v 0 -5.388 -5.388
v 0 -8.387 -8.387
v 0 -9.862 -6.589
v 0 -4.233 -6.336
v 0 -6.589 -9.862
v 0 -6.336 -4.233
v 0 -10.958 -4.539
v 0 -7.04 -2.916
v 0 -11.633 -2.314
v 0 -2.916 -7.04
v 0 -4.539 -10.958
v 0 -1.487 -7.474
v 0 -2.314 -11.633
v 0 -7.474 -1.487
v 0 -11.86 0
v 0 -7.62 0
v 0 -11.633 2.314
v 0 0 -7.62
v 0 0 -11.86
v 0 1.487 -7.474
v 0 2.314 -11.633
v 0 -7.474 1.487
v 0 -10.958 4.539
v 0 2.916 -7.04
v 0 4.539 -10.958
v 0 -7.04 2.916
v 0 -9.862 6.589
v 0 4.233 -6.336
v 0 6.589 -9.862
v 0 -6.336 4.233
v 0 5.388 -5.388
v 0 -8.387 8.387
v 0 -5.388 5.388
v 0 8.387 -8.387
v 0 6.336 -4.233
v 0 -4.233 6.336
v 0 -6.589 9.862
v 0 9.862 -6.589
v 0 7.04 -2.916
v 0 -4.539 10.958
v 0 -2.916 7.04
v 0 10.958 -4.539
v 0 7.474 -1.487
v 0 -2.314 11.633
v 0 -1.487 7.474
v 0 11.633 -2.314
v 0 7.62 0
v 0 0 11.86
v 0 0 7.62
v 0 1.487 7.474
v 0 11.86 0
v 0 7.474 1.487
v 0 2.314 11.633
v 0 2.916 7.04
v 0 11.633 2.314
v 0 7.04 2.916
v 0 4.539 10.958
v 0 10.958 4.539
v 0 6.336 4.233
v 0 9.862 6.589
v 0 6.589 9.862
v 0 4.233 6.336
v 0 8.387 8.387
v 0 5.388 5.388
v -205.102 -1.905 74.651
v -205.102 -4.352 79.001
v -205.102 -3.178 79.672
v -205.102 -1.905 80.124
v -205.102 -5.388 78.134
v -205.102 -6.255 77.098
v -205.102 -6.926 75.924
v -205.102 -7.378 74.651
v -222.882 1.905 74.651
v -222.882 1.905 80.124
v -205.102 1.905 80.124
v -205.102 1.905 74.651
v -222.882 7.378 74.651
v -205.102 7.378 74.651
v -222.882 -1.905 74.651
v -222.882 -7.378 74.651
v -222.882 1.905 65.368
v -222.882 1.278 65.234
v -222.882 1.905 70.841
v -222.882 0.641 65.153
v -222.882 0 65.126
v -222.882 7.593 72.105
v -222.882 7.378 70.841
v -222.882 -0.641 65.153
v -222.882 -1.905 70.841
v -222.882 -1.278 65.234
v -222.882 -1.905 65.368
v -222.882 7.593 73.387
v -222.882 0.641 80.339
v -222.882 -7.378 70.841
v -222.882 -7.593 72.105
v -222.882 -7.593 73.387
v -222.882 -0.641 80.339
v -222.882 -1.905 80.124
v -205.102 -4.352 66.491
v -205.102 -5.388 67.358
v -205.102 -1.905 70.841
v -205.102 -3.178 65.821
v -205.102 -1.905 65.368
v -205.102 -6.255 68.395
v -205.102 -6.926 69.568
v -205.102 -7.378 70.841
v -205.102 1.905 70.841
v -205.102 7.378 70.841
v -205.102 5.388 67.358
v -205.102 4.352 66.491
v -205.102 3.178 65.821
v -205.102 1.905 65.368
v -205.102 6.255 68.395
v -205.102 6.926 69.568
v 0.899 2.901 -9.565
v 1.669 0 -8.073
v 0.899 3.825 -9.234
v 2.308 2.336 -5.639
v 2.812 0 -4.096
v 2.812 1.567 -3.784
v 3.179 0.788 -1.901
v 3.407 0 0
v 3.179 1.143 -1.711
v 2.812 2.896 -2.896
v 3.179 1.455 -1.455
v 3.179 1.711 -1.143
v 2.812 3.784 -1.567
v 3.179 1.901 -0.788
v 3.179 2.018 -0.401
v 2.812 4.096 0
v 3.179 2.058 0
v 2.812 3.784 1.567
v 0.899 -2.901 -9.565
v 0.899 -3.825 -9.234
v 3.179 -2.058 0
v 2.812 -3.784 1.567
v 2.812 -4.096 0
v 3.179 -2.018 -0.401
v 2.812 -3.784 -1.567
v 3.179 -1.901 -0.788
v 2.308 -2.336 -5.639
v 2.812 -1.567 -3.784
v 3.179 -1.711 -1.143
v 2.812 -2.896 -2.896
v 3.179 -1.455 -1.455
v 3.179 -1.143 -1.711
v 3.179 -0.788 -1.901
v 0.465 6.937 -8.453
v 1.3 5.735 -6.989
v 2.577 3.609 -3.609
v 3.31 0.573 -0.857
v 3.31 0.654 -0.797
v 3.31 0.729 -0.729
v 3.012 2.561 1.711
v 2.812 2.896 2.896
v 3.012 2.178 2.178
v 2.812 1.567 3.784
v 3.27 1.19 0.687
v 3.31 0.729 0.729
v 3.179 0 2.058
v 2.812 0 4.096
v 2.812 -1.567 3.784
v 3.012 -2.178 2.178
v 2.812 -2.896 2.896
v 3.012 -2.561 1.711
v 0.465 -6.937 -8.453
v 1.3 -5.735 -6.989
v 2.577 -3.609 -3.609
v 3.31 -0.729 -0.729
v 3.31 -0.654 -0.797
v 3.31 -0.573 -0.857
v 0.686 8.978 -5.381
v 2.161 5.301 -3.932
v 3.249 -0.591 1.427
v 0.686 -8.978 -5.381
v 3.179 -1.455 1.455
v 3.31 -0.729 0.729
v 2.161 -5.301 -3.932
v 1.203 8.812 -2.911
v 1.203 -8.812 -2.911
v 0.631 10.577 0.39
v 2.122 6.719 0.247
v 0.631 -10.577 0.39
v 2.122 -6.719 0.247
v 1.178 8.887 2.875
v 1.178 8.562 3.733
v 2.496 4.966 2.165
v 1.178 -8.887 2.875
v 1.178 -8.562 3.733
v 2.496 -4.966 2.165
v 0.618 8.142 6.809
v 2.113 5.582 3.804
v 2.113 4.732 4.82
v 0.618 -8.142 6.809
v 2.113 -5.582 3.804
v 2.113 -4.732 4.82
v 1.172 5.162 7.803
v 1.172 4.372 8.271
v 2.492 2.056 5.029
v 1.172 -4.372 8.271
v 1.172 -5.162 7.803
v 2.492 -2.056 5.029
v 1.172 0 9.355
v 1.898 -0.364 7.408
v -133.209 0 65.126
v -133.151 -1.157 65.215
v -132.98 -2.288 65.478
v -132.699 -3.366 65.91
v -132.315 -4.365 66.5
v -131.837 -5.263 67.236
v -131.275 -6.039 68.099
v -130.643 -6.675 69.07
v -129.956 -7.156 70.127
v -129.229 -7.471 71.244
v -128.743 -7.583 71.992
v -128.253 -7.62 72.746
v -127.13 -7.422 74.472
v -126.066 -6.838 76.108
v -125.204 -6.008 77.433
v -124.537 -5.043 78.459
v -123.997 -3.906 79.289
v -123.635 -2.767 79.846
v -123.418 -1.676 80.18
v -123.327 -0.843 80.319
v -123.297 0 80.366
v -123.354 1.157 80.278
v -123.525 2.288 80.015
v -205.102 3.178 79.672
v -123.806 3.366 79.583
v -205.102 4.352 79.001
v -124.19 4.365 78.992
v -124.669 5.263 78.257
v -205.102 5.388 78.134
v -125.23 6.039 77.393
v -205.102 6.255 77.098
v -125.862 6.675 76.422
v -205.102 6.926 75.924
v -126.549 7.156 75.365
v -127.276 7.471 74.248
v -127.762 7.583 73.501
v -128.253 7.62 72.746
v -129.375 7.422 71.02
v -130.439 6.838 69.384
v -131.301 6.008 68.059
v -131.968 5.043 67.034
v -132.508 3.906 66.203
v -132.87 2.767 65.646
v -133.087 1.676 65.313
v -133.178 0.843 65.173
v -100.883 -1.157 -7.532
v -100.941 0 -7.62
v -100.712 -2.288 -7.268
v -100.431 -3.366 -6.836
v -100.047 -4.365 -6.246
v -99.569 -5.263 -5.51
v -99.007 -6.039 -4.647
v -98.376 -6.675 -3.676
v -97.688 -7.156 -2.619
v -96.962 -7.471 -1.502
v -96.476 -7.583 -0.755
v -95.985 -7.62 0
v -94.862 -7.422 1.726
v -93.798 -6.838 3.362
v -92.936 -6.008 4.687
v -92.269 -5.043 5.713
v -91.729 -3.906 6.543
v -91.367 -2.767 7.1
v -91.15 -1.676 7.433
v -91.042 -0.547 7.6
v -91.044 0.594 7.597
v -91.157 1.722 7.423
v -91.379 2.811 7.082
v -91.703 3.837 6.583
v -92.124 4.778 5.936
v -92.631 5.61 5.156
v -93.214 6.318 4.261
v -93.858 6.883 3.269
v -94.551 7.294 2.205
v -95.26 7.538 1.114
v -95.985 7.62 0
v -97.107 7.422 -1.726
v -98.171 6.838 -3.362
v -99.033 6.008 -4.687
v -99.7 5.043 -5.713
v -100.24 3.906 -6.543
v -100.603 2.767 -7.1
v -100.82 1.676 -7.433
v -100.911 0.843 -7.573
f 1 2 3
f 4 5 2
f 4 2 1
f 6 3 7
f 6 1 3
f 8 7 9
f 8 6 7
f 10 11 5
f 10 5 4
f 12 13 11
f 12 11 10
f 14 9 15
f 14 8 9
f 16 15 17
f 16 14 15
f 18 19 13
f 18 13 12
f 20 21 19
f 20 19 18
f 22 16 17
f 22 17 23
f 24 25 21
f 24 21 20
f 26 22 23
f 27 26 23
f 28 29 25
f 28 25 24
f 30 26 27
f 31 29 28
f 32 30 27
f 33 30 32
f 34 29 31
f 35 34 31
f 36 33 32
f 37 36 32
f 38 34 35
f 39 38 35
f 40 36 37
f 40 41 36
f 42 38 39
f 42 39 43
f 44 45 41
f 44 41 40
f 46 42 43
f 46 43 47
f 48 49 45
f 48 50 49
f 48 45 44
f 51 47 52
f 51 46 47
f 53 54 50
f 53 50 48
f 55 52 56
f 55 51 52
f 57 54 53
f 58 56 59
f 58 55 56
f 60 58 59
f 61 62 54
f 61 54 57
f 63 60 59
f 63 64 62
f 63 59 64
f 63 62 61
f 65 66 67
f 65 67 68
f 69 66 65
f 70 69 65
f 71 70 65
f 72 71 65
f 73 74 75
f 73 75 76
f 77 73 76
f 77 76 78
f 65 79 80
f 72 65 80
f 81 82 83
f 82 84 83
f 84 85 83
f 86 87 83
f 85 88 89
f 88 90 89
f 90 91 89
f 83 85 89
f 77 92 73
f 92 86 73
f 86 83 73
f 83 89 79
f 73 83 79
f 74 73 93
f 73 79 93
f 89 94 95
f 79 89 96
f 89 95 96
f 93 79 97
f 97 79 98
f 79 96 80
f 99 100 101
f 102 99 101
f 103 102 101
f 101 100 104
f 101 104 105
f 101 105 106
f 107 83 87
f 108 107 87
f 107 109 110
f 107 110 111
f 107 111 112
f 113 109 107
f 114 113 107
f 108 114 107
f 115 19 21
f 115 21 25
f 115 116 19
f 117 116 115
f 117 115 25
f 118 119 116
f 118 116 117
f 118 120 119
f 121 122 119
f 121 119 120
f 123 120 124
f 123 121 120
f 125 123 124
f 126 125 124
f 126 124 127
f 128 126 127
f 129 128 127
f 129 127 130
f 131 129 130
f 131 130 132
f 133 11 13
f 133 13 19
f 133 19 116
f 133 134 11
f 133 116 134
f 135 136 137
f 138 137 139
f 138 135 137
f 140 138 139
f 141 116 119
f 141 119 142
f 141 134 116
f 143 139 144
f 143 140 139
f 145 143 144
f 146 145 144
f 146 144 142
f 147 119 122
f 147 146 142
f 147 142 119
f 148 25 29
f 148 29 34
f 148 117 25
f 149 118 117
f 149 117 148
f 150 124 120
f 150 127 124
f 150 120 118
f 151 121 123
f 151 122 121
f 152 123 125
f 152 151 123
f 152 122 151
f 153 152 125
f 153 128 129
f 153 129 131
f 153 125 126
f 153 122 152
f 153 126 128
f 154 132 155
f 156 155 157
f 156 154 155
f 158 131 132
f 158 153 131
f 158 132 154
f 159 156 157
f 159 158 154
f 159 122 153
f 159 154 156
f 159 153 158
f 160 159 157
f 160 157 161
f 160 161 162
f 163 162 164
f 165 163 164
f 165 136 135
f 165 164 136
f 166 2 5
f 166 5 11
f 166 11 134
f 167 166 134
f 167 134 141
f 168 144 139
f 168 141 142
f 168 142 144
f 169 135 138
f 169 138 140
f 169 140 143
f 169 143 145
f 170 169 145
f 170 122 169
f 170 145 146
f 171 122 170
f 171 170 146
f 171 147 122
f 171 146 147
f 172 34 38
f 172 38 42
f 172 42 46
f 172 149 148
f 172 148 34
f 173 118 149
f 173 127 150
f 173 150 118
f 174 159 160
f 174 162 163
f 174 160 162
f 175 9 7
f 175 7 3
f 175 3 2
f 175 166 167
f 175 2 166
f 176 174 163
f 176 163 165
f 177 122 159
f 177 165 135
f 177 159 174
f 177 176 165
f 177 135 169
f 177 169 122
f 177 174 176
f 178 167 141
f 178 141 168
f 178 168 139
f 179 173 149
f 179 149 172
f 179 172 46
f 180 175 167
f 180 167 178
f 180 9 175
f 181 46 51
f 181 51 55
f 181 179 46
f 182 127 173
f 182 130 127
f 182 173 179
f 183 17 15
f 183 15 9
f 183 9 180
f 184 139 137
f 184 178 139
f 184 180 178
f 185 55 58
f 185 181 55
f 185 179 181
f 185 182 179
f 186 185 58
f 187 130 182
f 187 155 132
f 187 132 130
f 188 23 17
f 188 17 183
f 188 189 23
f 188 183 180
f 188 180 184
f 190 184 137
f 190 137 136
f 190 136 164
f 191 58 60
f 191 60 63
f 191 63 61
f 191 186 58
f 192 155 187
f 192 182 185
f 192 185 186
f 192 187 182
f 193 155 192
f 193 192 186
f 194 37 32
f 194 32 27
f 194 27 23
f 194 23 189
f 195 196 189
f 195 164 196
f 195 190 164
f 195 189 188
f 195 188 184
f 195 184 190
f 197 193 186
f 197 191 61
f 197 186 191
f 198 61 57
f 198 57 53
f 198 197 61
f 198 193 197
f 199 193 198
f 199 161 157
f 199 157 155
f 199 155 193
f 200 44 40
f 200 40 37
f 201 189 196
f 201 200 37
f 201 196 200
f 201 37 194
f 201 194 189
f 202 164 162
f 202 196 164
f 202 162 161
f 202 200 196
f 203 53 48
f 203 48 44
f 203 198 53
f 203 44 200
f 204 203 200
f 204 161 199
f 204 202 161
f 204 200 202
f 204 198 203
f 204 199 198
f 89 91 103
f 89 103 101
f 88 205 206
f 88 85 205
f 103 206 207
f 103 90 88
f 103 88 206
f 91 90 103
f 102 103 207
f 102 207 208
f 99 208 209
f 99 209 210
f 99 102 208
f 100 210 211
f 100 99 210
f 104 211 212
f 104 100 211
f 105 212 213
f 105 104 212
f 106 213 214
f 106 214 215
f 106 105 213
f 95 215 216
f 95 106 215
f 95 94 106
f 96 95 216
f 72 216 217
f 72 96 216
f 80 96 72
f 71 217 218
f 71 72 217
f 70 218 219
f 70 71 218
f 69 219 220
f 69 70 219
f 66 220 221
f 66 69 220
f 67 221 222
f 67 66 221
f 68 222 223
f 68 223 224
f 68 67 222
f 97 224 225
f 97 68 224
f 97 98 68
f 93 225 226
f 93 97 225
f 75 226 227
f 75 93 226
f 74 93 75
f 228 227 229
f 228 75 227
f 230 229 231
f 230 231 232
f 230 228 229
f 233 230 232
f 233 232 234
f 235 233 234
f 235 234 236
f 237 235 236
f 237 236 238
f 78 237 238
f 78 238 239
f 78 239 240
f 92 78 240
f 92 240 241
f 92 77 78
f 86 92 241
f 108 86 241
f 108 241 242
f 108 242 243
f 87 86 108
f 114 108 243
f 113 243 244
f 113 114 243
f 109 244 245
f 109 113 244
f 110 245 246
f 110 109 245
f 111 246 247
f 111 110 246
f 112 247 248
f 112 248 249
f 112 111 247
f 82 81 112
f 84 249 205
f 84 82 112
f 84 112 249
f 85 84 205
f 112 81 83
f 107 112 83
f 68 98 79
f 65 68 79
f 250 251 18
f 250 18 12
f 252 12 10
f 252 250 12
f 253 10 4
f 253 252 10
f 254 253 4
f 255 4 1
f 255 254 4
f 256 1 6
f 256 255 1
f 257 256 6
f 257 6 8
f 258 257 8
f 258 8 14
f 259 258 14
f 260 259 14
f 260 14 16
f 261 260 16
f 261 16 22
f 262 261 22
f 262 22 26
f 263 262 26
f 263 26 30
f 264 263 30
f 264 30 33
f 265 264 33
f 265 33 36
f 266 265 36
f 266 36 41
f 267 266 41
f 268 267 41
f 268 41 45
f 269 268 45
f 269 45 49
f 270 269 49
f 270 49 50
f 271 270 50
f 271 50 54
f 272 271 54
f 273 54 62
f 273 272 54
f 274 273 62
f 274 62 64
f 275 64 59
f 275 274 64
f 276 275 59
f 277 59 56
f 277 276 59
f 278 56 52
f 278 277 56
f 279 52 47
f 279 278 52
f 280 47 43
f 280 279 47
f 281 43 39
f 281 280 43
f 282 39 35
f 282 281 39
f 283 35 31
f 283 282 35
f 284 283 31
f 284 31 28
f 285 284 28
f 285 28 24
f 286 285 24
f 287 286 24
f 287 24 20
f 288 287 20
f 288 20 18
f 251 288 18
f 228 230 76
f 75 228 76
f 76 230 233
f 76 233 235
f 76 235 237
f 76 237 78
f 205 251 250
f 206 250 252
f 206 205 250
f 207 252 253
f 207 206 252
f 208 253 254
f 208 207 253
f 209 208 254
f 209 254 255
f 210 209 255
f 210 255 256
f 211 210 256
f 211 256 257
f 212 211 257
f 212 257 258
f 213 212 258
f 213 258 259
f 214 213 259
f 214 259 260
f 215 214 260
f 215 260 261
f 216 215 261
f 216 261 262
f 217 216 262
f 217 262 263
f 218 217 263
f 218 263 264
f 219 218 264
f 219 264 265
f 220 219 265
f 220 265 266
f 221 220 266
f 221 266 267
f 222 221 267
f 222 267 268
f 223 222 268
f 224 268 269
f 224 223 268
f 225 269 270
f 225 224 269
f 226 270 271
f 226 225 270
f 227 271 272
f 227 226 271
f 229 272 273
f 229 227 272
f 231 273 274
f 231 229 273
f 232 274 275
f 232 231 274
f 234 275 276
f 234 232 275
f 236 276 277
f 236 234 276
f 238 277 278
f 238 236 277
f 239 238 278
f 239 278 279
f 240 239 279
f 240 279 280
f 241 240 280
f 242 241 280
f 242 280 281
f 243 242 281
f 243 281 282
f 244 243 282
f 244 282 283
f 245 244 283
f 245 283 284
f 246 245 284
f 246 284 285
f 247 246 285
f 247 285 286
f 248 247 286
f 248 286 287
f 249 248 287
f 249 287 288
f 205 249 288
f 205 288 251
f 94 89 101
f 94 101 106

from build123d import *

# Parameters (mm, degrees)
SKETCH3_R          = 7.62
CUT_EXTRUDE3_DEPTH = 17.78
CUT_EXTRUDE4_DEPTH = 17.78


with BuildPart() as part:
    # Sweep1: sweep along a path in Sketch1
    with BuildLine(Plane(origin=(0, 0, 0), x_dir=(1, 0, 0), z_dir=(0, 1, 0))) as sweep1_path:
        Line((0, 0), (-95.984915269, 0))
        Line((-95.984915269, 0), (-128.252610358, -72.746173646))
        Line((-128.252610358, -72.746173646), (-222.882267399, -72.746173646))
    # Sketch3 → Sweep1 (sweep)
    with BuildSketch(Plane(origin=(0, 0, 0), x_dir=(0, 0, -1), z_dir=(1, 0, 0))):
        Circle(SKETCH3_R)
    sweep(path=sweep1_path.line, transition=Transition.RIGHT)

    # Sketch6 → Revolve1 (revolve)
    with BuildSketch(Plane(origin=(0, 0, 0), x_dir=(1, 0, 0), z_dir=(0, 1, 0))):
        with BuildLine():
            Line((0, 0), (0, 11.860460566))
            ThreePointArc((0, 11.860460566), (2.307736562, 6.103805999), (3.406950908, 0))
            Line((3.406950908, 0), (0, 0))
        make_face()
    revolve(axis=Axis((0, 0, 0), (1, 0, 0)))

    # Sketch4 → Cut-Extrude3 (cut)
    with BuildSketch(Plane.ZY.offset(222.882267399)):
        with BuildLine():
            Line((80.12420692, 1.905), (74.651173646, 1.905))
            Line((74.651173646, 1.905), (74.651173646, 7.378033275))
            ThreePointArc((74.651173646, 7.378033275), (78.134327318, 5.388153673), (80.12420692, 1.905))
        make_face()
    cut_extrude3 = extrude(amount=-CUT_EXTRUDE3_DEPTH, mode=Mode.SUBTRACT)

    # Mirror3: Cut-Extrude3 across plane
    add(cut_extrude3.mirror(Plane.ZX), mode=Mode.SUBTRACT)

    # Sketch5 → Cut-Extrude4 (cut)
    with BuildSketch(Plane.ZY.offset(222.882267399)):
        with BuildLine():
            Line((65.368140371, 1.905), (70.841173646, 1.905))
            Line((70.841173646, 1.905), (70.841173646, 7.378033275))
            ThreePointArc((70.841173646, 7.378033275), (67.358019973, 5.388153673), (65.368140371, 1.905))
        make_face()
    cut_extrude4 = extrude(amount=-CUT_EXTRUDE4_DEPTH, mode=Mode.SUBTRACT)

    # Mirror4: Cut-Extrude4 across plane
    add(cut_extrude4.mirror(Plane.ZX), mode=Mode.SUBTRACT)


solid = part.part
